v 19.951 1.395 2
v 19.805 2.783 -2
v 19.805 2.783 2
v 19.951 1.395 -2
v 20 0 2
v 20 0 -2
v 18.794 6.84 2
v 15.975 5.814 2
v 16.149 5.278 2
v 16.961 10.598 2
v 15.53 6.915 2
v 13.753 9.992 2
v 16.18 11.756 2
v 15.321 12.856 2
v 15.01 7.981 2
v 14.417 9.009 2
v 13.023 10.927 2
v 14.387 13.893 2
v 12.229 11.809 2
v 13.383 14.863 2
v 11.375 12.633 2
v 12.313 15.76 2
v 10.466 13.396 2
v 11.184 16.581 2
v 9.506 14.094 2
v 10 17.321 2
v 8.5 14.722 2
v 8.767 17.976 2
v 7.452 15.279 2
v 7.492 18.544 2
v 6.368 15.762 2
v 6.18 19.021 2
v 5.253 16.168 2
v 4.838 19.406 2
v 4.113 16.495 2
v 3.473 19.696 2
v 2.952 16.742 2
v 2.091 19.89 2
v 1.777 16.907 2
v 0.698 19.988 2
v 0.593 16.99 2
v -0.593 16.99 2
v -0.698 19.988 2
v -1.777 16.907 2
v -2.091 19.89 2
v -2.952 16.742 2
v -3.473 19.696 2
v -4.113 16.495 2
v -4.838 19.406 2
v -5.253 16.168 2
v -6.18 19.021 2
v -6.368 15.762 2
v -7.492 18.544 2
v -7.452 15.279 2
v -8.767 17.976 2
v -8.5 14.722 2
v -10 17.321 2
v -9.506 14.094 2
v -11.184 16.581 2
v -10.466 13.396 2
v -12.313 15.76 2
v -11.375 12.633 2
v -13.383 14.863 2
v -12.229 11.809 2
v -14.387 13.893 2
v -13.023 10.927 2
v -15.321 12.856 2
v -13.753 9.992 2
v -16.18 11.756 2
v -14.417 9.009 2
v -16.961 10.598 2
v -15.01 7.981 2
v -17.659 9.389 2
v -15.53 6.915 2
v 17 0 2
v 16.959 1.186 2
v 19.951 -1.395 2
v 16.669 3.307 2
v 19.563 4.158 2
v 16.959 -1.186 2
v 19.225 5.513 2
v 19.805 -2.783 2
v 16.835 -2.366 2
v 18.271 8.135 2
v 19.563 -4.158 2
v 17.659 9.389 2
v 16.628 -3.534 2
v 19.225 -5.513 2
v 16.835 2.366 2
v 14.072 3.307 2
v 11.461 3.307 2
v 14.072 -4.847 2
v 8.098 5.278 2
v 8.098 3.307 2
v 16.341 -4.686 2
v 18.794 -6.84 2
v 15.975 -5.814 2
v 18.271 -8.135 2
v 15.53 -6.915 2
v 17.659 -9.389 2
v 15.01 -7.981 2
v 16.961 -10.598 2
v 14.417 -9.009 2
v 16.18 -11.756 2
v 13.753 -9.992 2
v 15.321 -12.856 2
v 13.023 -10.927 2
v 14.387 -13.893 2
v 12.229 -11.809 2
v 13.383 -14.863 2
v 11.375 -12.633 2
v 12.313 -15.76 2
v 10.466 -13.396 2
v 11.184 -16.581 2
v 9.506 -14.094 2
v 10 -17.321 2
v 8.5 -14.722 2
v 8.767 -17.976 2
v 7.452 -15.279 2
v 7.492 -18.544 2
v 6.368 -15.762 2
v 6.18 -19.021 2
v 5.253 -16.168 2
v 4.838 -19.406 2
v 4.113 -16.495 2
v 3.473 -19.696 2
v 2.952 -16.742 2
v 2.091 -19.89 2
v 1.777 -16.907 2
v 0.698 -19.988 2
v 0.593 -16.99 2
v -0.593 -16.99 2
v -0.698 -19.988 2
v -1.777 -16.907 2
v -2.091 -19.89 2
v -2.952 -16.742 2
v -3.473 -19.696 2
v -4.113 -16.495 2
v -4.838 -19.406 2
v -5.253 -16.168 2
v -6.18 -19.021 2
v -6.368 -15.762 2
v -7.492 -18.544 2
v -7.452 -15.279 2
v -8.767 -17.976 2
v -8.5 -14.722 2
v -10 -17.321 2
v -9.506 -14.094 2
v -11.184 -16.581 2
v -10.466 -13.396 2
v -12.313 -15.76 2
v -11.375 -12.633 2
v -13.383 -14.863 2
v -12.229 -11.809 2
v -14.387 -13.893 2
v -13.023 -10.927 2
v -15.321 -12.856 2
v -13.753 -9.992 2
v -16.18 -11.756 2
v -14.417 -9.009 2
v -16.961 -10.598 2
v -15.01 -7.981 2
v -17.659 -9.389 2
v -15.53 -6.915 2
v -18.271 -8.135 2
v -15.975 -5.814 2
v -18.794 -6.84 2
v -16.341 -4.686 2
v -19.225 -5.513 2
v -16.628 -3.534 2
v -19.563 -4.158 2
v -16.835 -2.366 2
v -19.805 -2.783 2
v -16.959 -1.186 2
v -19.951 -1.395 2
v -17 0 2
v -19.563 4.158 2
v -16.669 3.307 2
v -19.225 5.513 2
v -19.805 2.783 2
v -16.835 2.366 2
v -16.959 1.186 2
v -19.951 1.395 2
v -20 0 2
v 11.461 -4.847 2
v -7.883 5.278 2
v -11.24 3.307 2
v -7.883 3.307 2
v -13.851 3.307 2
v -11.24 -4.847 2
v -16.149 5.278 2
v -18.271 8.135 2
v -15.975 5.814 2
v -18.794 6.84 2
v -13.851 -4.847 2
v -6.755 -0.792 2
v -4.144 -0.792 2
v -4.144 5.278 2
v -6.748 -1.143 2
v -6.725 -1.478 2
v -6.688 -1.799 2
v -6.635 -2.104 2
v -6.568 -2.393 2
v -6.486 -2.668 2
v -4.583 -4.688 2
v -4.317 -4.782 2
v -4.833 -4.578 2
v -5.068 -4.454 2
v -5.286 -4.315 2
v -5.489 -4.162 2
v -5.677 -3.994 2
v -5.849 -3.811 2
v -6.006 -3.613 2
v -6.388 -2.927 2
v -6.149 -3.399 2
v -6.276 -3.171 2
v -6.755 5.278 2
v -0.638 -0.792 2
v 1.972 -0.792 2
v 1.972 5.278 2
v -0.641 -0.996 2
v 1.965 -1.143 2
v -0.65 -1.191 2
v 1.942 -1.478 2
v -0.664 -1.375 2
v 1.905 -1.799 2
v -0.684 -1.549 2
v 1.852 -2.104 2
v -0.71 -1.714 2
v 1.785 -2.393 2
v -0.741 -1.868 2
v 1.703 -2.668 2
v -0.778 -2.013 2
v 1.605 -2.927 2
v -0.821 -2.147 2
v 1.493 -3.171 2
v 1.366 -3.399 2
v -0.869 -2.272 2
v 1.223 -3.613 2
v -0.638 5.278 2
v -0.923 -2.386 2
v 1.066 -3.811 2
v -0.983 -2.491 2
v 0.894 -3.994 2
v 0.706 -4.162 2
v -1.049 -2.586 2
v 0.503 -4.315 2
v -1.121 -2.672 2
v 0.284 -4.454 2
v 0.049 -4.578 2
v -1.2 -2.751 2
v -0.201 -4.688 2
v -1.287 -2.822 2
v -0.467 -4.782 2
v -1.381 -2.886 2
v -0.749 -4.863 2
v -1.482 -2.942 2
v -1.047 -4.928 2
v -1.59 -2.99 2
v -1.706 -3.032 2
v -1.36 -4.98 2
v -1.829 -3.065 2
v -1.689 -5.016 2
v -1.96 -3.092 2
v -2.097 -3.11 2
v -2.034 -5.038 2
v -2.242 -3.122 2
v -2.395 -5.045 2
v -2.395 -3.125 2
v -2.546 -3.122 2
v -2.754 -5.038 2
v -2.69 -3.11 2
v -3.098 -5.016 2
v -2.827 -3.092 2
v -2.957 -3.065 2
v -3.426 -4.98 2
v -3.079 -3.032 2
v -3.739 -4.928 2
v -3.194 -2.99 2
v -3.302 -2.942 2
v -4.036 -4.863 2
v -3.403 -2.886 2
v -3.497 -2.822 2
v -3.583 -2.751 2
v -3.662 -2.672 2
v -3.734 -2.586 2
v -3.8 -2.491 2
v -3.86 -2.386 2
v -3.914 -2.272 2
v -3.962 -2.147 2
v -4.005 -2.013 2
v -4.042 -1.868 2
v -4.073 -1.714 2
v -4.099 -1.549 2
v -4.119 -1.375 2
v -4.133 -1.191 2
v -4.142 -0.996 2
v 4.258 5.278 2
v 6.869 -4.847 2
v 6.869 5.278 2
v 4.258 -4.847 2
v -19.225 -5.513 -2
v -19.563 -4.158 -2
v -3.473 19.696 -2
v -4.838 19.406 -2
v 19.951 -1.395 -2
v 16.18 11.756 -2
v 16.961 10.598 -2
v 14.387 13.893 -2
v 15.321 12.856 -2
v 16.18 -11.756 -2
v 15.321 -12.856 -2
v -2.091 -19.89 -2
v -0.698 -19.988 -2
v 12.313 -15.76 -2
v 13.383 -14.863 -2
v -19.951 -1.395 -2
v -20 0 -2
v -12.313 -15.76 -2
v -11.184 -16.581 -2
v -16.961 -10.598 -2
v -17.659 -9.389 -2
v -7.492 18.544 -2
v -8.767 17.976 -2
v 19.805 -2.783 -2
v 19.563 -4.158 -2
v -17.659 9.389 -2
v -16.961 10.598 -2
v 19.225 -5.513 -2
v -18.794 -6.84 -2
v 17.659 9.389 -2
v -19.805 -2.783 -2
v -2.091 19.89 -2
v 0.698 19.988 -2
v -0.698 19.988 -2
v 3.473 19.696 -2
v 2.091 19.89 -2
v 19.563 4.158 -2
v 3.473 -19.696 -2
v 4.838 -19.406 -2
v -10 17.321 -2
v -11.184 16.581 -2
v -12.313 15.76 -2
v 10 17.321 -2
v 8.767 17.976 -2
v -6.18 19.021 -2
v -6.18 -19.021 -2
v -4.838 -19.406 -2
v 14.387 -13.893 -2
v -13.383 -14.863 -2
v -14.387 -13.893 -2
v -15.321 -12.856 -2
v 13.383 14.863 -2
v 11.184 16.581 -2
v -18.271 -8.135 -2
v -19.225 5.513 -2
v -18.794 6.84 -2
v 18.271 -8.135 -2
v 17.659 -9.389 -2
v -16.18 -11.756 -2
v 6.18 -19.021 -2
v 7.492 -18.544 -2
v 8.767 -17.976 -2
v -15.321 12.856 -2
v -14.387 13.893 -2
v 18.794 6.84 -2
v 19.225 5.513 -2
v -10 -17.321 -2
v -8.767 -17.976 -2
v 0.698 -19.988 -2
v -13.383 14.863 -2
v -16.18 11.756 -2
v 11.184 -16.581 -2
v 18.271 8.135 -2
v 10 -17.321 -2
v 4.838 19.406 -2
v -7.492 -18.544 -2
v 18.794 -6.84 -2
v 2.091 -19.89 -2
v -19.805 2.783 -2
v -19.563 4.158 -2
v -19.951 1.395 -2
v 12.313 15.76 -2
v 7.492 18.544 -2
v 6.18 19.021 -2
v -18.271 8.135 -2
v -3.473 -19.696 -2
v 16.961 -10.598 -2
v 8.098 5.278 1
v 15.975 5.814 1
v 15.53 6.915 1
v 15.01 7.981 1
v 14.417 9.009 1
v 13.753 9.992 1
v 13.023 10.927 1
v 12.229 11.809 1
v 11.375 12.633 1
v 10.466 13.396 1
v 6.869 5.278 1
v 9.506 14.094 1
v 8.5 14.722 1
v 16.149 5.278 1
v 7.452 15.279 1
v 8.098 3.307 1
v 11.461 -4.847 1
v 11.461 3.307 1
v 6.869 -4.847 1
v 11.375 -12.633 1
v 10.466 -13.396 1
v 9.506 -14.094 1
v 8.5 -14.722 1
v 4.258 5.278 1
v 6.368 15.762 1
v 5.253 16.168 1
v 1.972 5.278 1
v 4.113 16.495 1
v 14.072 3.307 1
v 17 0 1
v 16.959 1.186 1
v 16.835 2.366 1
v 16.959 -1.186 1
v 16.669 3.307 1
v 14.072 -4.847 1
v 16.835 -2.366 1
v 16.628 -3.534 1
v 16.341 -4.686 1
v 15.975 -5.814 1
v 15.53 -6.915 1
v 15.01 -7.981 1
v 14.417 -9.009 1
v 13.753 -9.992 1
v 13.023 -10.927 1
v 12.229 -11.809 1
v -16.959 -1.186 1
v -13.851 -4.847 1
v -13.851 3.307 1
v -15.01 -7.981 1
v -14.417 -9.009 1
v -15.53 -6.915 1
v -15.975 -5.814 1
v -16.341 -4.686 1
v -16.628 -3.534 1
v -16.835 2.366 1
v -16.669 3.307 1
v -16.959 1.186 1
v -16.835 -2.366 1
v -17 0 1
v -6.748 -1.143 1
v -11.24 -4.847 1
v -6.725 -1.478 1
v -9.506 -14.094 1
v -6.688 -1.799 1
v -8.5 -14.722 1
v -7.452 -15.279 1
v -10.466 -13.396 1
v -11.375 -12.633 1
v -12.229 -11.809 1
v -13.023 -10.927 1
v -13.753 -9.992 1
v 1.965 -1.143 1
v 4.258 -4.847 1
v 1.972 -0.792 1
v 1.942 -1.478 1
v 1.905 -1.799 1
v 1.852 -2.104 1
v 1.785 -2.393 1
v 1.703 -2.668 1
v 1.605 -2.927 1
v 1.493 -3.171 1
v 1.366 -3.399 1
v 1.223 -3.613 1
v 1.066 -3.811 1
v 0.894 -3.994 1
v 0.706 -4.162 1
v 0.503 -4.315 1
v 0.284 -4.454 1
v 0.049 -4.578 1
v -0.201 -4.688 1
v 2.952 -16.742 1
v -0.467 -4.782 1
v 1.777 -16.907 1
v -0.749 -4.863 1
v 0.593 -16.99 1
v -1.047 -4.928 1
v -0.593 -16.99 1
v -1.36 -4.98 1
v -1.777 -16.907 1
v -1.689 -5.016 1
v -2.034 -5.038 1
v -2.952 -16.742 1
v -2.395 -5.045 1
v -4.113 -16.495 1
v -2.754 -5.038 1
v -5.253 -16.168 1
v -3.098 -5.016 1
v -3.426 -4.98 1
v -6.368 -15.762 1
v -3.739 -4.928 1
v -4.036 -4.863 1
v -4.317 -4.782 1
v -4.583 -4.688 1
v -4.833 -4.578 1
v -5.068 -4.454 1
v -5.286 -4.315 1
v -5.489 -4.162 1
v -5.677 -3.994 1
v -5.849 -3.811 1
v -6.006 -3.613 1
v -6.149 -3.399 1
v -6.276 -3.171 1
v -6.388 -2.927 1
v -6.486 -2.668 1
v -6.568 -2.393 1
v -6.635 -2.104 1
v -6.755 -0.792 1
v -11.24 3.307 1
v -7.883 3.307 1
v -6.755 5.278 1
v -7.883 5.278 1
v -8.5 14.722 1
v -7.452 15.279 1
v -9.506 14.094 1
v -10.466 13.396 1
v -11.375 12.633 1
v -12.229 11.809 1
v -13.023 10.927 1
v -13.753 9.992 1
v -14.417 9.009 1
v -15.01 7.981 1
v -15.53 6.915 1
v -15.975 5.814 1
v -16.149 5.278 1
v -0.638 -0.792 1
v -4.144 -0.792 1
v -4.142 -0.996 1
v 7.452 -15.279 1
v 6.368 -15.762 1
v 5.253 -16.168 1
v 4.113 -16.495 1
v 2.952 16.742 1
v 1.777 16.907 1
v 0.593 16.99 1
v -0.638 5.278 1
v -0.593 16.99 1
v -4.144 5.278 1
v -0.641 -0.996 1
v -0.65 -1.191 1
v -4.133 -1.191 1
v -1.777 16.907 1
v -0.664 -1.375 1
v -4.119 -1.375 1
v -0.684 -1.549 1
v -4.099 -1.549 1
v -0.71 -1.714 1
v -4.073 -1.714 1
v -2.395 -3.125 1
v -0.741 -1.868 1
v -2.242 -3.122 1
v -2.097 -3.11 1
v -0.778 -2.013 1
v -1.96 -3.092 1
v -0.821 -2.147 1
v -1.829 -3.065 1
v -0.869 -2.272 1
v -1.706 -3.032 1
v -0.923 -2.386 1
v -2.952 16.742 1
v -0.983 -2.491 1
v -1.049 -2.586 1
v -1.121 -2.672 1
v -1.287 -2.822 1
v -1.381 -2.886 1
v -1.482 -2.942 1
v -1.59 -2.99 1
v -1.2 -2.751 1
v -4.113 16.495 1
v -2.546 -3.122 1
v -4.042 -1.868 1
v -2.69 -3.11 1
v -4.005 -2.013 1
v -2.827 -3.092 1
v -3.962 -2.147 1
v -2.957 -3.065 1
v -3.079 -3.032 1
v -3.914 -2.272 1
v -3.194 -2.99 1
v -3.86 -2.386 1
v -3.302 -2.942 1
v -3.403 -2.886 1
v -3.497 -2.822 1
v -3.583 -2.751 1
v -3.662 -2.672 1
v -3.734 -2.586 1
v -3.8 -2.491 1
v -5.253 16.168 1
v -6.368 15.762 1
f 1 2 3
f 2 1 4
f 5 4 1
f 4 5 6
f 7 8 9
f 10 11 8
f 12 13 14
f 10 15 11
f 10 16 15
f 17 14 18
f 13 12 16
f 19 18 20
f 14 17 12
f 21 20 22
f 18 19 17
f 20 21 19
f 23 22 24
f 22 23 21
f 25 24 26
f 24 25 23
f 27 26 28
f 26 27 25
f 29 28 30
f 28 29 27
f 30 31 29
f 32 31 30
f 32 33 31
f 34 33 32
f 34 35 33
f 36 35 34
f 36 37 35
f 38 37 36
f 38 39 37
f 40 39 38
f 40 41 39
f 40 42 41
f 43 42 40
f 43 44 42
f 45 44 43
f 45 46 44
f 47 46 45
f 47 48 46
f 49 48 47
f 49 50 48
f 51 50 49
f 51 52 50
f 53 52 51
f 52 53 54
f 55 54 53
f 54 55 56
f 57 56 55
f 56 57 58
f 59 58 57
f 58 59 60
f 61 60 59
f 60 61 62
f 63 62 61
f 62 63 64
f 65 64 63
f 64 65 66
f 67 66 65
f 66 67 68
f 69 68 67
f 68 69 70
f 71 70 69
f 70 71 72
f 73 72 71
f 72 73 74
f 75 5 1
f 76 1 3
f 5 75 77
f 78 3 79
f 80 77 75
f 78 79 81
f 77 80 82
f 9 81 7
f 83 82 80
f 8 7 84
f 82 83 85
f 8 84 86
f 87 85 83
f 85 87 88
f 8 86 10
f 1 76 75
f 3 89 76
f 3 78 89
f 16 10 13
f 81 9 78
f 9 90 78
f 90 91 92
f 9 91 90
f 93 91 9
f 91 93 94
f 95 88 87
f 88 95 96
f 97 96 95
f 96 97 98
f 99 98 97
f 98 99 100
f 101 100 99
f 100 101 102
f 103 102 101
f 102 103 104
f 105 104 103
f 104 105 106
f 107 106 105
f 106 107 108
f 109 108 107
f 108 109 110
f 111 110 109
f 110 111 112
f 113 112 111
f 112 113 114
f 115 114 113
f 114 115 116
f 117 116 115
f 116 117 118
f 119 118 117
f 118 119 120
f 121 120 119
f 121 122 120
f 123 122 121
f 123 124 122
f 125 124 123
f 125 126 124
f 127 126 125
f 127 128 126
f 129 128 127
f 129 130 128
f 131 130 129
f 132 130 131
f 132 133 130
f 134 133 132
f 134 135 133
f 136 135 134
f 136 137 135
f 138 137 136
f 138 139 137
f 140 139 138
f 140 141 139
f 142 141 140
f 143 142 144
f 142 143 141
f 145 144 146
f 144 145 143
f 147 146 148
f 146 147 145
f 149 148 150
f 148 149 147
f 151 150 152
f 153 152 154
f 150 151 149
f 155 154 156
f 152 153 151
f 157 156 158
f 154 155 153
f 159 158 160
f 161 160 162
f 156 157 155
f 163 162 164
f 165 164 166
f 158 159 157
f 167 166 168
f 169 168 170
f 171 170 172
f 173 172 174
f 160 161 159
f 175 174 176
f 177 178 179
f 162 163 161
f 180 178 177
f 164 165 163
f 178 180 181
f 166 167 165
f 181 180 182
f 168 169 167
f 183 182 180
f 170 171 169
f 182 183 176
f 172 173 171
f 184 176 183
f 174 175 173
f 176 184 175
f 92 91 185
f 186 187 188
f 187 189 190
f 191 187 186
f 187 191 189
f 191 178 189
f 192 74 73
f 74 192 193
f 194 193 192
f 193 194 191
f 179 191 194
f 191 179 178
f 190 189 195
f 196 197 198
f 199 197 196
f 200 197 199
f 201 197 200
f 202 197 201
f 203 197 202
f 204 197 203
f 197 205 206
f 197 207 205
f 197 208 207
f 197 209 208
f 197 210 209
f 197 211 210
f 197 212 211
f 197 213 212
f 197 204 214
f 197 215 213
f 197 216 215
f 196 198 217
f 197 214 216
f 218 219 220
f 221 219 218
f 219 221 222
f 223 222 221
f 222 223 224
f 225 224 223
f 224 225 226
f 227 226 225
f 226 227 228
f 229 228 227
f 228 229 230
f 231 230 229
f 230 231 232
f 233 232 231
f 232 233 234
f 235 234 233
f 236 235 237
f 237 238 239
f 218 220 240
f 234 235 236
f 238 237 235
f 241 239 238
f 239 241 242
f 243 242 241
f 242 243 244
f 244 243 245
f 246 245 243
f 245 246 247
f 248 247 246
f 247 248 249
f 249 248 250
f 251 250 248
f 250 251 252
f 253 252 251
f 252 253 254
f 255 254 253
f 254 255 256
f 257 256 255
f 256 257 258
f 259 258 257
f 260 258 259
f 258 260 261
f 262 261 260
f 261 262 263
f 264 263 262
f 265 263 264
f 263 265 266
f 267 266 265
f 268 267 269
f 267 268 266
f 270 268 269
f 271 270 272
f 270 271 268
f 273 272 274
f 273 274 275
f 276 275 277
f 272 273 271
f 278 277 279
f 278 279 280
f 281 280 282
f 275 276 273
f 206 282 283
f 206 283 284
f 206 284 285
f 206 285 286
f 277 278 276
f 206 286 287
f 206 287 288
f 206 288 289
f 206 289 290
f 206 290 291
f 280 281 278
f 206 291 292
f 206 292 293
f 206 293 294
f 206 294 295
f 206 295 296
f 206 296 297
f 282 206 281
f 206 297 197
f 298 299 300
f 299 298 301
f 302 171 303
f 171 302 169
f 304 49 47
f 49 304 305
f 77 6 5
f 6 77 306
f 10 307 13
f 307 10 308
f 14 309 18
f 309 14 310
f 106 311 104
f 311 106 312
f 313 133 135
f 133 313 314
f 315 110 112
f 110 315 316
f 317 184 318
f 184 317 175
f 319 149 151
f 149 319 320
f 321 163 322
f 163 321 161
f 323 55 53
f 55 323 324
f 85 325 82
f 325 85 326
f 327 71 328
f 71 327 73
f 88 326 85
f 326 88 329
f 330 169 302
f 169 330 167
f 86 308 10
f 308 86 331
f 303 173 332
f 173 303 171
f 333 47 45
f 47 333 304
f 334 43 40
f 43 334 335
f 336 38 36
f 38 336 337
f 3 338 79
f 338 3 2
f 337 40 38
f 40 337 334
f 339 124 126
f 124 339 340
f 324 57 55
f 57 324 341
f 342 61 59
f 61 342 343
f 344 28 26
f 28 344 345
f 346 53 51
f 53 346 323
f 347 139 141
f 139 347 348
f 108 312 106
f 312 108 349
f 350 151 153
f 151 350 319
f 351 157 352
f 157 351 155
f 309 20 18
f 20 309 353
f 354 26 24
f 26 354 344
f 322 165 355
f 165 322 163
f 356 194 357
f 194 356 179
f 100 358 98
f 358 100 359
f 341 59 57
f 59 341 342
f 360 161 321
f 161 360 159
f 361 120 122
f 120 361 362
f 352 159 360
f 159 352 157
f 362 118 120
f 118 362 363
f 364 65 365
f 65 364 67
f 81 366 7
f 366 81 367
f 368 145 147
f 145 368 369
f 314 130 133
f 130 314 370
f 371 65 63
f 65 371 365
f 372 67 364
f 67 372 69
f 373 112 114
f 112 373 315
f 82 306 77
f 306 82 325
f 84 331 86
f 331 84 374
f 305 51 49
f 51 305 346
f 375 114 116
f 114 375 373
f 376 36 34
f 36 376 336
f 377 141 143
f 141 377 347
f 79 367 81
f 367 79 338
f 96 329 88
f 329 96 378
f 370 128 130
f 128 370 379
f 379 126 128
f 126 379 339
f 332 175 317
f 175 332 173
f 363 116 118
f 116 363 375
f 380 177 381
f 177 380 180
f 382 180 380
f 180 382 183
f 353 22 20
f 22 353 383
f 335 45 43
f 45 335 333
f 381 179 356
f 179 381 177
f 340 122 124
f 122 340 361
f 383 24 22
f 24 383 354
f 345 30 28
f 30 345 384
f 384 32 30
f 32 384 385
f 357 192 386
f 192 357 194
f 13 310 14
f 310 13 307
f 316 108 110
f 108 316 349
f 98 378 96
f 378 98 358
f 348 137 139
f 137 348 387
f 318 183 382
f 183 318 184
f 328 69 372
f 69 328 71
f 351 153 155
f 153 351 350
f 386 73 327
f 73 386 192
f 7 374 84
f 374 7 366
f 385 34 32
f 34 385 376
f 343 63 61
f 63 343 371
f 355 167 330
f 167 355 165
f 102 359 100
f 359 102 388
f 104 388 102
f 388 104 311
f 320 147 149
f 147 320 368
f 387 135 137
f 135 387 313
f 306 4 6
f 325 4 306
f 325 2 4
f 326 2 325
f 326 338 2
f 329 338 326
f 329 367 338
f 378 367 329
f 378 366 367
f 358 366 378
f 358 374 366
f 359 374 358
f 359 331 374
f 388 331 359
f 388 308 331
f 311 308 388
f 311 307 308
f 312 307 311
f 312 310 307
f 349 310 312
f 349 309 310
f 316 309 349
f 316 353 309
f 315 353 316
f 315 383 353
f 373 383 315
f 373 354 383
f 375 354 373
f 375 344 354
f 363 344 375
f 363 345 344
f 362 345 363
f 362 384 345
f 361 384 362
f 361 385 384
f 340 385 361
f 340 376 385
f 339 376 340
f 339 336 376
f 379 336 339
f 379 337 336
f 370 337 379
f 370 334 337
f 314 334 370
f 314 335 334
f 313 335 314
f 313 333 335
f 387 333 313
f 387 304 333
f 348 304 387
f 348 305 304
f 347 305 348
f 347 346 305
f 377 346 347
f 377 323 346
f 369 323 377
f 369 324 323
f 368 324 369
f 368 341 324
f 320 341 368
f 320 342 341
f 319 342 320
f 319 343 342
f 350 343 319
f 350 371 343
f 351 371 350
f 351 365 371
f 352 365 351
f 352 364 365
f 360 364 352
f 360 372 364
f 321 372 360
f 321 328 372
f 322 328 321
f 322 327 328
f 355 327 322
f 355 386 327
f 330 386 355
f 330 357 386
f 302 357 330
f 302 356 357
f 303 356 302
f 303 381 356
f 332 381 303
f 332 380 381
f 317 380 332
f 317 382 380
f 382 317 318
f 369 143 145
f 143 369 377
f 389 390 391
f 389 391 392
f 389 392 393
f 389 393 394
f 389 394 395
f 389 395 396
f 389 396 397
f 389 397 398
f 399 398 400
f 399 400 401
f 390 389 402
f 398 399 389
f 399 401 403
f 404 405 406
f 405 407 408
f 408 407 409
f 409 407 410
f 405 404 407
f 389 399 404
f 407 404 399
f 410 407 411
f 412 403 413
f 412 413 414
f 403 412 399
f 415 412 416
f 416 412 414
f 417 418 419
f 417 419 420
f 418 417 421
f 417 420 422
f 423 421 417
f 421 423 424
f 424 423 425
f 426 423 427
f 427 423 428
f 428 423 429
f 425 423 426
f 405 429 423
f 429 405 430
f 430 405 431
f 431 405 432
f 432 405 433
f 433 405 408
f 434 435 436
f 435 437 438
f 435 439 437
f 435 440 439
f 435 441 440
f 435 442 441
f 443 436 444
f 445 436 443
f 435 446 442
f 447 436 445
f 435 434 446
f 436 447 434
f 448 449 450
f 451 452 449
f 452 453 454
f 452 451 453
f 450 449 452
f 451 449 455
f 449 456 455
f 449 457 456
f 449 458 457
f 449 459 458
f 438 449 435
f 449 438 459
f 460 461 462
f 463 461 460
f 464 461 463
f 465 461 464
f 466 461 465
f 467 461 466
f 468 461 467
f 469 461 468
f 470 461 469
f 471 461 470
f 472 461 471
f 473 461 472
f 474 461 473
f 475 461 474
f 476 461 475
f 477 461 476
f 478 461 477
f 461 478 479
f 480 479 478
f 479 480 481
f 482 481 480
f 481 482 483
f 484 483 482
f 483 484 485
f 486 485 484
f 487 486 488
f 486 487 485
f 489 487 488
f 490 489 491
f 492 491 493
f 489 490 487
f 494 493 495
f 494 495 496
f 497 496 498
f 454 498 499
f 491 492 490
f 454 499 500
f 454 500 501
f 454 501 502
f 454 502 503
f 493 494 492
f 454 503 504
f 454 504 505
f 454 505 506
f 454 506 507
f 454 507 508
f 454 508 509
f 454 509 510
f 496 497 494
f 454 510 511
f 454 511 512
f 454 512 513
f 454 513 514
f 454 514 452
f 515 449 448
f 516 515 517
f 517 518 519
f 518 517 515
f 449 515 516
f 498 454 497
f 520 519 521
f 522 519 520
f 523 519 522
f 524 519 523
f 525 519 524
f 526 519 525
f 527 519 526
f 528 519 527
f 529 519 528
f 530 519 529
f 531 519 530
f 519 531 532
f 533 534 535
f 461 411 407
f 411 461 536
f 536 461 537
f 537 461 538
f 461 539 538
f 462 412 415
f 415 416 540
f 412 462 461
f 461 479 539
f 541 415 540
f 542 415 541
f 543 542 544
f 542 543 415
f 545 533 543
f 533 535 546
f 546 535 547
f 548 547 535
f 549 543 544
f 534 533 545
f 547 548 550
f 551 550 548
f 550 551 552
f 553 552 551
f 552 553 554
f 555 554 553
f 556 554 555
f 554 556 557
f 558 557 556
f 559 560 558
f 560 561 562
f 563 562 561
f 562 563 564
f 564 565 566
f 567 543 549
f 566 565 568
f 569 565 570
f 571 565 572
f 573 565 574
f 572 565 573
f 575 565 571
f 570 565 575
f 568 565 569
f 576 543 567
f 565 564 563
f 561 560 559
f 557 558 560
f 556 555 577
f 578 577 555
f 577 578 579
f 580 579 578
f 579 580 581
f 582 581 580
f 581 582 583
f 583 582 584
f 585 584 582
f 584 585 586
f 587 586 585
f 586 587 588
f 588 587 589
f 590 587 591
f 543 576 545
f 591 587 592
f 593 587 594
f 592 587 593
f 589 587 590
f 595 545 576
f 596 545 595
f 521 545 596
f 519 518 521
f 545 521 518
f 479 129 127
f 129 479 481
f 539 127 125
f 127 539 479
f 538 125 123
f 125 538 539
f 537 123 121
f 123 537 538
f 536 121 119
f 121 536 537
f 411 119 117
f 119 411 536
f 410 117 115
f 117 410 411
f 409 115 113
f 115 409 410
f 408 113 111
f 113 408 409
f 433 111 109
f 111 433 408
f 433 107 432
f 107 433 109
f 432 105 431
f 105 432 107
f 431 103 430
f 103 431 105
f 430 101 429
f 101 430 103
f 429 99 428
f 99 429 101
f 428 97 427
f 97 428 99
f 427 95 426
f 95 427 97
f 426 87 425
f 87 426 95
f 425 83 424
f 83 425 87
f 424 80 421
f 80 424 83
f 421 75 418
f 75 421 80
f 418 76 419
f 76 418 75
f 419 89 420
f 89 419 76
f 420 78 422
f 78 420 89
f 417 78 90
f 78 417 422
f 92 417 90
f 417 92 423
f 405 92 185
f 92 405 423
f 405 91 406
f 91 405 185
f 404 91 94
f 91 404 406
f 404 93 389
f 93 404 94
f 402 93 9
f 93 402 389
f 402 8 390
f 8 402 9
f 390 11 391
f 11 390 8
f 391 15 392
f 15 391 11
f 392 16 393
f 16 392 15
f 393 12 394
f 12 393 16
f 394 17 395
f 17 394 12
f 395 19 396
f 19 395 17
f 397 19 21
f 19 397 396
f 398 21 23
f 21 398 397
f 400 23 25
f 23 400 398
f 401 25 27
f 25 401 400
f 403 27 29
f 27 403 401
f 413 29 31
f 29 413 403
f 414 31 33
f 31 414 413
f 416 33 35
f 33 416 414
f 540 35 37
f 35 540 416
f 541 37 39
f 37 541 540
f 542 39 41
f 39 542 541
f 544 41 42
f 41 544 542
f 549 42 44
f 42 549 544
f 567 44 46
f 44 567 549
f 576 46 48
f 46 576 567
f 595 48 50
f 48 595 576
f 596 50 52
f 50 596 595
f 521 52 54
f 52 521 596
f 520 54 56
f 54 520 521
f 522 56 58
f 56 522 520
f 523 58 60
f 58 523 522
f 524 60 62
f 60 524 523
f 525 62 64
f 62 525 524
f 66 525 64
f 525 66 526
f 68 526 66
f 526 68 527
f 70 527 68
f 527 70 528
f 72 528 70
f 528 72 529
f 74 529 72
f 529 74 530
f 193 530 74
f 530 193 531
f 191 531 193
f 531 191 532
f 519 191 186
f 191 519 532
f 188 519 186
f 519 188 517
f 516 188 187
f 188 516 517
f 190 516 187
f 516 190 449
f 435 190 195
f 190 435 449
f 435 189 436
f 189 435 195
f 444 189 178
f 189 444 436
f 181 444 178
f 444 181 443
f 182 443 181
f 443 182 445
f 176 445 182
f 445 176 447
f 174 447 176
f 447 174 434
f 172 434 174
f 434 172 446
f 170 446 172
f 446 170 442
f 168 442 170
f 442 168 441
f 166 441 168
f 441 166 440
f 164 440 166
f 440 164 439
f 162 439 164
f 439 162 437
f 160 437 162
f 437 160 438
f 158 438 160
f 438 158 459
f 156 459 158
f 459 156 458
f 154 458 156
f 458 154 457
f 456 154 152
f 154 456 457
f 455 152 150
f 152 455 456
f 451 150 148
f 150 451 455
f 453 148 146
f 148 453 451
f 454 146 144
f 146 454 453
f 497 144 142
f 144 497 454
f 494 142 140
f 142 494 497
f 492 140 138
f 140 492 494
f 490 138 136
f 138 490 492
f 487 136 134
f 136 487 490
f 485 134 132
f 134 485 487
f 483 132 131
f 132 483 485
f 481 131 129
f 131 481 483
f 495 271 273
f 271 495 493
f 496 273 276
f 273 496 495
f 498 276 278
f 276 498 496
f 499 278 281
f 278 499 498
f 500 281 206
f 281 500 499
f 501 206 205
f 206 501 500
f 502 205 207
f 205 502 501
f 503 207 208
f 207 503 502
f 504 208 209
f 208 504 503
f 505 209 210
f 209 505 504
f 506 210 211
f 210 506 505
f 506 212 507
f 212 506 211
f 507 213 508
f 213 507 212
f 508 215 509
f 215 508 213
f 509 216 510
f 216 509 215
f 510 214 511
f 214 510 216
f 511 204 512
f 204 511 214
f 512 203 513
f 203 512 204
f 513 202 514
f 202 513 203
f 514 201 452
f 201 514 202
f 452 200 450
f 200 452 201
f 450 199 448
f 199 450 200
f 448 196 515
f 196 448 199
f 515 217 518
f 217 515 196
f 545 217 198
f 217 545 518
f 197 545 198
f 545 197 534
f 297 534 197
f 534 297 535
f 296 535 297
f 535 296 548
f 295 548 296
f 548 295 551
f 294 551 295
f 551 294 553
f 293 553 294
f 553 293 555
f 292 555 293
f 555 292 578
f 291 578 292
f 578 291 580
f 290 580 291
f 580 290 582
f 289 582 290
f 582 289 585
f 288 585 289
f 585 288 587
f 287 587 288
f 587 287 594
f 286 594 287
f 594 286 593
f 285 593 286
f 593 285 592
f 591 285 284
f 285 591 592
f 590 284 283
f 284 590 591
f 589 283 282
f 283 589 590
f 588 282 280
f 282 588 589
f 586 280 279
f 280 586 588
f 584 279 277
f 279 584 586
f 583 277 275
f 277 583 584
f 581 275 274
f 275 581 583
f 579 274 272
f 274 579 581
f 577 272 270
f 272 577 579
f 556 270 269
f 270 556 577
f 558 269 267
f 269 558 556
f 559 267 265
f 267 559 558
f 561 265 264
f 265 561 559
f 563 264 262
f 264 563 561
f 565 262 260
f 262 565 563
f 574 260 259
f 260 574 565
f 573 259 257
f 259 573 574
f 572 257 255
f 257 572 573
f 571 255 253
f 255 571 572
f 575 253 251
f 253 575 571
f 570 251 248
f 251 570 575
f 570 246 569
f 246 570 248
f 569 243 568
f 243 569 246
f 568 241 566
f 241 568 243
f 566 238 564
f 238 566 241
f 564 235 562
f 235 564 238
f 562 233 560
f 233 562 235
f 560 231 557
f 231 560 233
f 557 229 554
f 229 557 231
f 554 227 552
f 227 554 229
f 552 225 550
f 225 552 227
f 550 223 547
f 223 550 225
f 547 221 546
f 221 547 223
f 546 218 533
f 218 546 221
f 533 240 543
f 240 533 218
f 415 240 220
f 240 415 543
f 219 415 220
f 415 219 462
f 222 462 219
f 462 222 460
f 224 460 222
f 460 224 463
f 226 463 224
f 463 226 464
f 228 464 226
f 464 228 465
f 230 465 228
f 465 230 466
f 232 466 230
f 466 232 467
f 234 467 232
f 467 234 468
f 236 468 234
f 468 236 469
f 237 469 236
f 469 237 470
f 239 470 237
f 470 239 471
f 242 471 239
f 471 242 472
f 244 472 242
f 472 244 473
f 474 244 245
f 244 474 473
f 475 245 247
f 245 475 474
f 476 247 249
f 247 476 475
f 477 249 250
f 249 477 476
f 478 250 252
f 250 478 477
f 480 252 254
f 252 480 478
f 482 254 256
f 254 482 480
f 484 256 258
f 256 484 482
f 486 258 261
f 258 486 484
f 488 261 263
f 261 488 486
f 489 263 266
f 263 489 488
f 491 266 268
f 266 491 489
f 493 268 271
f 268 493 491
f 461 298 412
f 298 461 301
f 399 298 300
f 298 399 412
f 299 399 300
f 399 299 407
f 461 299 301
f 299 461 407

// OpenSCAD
$fn = 90;

module logo() {
    
    vier = [ 
        [ 0, 1 ],
        [ 0, 2 ],
        [ 1, 1 ],
        [ 1, 3 ],
        [ 2, 0 ],
        [ 2, 1 ],
        [ 2, 2 ],
        [ 2, 3 ],
        [ 2, 4 ],
        [ 3, 1 ]
    ];
    twee = [
        [ 0,0 ],
        [ 0,3 ],
        [ 1,0 ],
        [ 1,1 ],
        [ 1,4 ],
        [ 2,0 ],
        [ 2,2 ],
        [ 2,4 ],
        [ 3,0 ],
        [ 3,3 ]
    ];
    
    hek = [
        [ 0, 1 ],
        [ 1, 0 ],
        [ 1, 1 ],
        [ 1, 3 ],
        [ 2, 0 ],
        [ 2, 1 ],
        [ 2, 2 ],
        [ 2, 3 ],
        [ 3, 1 ],
        [ 3, 2 ],
        [ 3, 3 ],
        [ 3, 4 ],
        [ 4, 1 ],
        [ 4, 3 ],
        [ 4, 4 ],
        [ 5, 0 ],
        [ 5, 1 ],
        [ 5, 3 ],
        [ 6, 0 ],
        [ 6, 1 ],
        [ 6, 2 ],
        [ 6, 3 ],
        [ 7, 1 ],
        [ 7, 2 ],
        [ 7, 3 ],
        [ 7, 4 ],
        [ 8, 1 ],
        [ 8, 3 ],
        [ 8, 4 ],
        [ 9, 3 ],
    ];
    
    translate( [ -11.5/2, -8/2 ] ) {
        
        translate( [ 0, 3 ] ) for ( i = hek ) {
            translate( [ i[0]/2, i[1] ] ) square( [ 1/2, 1 ] );
        }
        translate( [ 3.5, 0 ] ) for ( i = vier ) {
            translate( [ i[0], i[1] ] ) square( [ 1, 1 ] );
        }
        translate( [ 7.5, 0 ] ) for ( i = twee ) {
            translate( [ i[0], i[1] ] ) square( [ 1, 1 ] );
        }
    }
        
        
    
}


module round_tuit() {
    
    module face() {
        linear_extrude( height = 1.5 ) {
            difference() {
                circle( d = 34 );
                text( "TUIT", 
                    font="Noto Sans:style=Bold", 
                    //font="Open Sans:style=Bold",
                    //font="PT Sans:style=Bold",
                    //font="Source Sans Pro:style=Bold",
                    halign="center", valign="center" 
                );
            }
        }
    }
    
    module obverse() {
        linear_extrude( height = 1.5 ) {
            difference() {
                circle( d = 34 );
                translate( [ -1, 0 ] )
                scale( 2.2 ) logo();
            }
        }
    }
    
    difference() {
        translate( [ 0, 0, -2 ] ) cylinder( d = 40, h = 4 );
        translate( [ 0, 0, 1 ] ) face();
        translate( [ 0, 0, -1 ] ) rotate( [ 180, 0, 0 ] ) obverse();
    }
    
}

difference() {
    round_tuit();
    // just for viewing the cross section
*    translate( [0, 0, -5 ] ) cube( [ 30, 30, 10 ] );
}
